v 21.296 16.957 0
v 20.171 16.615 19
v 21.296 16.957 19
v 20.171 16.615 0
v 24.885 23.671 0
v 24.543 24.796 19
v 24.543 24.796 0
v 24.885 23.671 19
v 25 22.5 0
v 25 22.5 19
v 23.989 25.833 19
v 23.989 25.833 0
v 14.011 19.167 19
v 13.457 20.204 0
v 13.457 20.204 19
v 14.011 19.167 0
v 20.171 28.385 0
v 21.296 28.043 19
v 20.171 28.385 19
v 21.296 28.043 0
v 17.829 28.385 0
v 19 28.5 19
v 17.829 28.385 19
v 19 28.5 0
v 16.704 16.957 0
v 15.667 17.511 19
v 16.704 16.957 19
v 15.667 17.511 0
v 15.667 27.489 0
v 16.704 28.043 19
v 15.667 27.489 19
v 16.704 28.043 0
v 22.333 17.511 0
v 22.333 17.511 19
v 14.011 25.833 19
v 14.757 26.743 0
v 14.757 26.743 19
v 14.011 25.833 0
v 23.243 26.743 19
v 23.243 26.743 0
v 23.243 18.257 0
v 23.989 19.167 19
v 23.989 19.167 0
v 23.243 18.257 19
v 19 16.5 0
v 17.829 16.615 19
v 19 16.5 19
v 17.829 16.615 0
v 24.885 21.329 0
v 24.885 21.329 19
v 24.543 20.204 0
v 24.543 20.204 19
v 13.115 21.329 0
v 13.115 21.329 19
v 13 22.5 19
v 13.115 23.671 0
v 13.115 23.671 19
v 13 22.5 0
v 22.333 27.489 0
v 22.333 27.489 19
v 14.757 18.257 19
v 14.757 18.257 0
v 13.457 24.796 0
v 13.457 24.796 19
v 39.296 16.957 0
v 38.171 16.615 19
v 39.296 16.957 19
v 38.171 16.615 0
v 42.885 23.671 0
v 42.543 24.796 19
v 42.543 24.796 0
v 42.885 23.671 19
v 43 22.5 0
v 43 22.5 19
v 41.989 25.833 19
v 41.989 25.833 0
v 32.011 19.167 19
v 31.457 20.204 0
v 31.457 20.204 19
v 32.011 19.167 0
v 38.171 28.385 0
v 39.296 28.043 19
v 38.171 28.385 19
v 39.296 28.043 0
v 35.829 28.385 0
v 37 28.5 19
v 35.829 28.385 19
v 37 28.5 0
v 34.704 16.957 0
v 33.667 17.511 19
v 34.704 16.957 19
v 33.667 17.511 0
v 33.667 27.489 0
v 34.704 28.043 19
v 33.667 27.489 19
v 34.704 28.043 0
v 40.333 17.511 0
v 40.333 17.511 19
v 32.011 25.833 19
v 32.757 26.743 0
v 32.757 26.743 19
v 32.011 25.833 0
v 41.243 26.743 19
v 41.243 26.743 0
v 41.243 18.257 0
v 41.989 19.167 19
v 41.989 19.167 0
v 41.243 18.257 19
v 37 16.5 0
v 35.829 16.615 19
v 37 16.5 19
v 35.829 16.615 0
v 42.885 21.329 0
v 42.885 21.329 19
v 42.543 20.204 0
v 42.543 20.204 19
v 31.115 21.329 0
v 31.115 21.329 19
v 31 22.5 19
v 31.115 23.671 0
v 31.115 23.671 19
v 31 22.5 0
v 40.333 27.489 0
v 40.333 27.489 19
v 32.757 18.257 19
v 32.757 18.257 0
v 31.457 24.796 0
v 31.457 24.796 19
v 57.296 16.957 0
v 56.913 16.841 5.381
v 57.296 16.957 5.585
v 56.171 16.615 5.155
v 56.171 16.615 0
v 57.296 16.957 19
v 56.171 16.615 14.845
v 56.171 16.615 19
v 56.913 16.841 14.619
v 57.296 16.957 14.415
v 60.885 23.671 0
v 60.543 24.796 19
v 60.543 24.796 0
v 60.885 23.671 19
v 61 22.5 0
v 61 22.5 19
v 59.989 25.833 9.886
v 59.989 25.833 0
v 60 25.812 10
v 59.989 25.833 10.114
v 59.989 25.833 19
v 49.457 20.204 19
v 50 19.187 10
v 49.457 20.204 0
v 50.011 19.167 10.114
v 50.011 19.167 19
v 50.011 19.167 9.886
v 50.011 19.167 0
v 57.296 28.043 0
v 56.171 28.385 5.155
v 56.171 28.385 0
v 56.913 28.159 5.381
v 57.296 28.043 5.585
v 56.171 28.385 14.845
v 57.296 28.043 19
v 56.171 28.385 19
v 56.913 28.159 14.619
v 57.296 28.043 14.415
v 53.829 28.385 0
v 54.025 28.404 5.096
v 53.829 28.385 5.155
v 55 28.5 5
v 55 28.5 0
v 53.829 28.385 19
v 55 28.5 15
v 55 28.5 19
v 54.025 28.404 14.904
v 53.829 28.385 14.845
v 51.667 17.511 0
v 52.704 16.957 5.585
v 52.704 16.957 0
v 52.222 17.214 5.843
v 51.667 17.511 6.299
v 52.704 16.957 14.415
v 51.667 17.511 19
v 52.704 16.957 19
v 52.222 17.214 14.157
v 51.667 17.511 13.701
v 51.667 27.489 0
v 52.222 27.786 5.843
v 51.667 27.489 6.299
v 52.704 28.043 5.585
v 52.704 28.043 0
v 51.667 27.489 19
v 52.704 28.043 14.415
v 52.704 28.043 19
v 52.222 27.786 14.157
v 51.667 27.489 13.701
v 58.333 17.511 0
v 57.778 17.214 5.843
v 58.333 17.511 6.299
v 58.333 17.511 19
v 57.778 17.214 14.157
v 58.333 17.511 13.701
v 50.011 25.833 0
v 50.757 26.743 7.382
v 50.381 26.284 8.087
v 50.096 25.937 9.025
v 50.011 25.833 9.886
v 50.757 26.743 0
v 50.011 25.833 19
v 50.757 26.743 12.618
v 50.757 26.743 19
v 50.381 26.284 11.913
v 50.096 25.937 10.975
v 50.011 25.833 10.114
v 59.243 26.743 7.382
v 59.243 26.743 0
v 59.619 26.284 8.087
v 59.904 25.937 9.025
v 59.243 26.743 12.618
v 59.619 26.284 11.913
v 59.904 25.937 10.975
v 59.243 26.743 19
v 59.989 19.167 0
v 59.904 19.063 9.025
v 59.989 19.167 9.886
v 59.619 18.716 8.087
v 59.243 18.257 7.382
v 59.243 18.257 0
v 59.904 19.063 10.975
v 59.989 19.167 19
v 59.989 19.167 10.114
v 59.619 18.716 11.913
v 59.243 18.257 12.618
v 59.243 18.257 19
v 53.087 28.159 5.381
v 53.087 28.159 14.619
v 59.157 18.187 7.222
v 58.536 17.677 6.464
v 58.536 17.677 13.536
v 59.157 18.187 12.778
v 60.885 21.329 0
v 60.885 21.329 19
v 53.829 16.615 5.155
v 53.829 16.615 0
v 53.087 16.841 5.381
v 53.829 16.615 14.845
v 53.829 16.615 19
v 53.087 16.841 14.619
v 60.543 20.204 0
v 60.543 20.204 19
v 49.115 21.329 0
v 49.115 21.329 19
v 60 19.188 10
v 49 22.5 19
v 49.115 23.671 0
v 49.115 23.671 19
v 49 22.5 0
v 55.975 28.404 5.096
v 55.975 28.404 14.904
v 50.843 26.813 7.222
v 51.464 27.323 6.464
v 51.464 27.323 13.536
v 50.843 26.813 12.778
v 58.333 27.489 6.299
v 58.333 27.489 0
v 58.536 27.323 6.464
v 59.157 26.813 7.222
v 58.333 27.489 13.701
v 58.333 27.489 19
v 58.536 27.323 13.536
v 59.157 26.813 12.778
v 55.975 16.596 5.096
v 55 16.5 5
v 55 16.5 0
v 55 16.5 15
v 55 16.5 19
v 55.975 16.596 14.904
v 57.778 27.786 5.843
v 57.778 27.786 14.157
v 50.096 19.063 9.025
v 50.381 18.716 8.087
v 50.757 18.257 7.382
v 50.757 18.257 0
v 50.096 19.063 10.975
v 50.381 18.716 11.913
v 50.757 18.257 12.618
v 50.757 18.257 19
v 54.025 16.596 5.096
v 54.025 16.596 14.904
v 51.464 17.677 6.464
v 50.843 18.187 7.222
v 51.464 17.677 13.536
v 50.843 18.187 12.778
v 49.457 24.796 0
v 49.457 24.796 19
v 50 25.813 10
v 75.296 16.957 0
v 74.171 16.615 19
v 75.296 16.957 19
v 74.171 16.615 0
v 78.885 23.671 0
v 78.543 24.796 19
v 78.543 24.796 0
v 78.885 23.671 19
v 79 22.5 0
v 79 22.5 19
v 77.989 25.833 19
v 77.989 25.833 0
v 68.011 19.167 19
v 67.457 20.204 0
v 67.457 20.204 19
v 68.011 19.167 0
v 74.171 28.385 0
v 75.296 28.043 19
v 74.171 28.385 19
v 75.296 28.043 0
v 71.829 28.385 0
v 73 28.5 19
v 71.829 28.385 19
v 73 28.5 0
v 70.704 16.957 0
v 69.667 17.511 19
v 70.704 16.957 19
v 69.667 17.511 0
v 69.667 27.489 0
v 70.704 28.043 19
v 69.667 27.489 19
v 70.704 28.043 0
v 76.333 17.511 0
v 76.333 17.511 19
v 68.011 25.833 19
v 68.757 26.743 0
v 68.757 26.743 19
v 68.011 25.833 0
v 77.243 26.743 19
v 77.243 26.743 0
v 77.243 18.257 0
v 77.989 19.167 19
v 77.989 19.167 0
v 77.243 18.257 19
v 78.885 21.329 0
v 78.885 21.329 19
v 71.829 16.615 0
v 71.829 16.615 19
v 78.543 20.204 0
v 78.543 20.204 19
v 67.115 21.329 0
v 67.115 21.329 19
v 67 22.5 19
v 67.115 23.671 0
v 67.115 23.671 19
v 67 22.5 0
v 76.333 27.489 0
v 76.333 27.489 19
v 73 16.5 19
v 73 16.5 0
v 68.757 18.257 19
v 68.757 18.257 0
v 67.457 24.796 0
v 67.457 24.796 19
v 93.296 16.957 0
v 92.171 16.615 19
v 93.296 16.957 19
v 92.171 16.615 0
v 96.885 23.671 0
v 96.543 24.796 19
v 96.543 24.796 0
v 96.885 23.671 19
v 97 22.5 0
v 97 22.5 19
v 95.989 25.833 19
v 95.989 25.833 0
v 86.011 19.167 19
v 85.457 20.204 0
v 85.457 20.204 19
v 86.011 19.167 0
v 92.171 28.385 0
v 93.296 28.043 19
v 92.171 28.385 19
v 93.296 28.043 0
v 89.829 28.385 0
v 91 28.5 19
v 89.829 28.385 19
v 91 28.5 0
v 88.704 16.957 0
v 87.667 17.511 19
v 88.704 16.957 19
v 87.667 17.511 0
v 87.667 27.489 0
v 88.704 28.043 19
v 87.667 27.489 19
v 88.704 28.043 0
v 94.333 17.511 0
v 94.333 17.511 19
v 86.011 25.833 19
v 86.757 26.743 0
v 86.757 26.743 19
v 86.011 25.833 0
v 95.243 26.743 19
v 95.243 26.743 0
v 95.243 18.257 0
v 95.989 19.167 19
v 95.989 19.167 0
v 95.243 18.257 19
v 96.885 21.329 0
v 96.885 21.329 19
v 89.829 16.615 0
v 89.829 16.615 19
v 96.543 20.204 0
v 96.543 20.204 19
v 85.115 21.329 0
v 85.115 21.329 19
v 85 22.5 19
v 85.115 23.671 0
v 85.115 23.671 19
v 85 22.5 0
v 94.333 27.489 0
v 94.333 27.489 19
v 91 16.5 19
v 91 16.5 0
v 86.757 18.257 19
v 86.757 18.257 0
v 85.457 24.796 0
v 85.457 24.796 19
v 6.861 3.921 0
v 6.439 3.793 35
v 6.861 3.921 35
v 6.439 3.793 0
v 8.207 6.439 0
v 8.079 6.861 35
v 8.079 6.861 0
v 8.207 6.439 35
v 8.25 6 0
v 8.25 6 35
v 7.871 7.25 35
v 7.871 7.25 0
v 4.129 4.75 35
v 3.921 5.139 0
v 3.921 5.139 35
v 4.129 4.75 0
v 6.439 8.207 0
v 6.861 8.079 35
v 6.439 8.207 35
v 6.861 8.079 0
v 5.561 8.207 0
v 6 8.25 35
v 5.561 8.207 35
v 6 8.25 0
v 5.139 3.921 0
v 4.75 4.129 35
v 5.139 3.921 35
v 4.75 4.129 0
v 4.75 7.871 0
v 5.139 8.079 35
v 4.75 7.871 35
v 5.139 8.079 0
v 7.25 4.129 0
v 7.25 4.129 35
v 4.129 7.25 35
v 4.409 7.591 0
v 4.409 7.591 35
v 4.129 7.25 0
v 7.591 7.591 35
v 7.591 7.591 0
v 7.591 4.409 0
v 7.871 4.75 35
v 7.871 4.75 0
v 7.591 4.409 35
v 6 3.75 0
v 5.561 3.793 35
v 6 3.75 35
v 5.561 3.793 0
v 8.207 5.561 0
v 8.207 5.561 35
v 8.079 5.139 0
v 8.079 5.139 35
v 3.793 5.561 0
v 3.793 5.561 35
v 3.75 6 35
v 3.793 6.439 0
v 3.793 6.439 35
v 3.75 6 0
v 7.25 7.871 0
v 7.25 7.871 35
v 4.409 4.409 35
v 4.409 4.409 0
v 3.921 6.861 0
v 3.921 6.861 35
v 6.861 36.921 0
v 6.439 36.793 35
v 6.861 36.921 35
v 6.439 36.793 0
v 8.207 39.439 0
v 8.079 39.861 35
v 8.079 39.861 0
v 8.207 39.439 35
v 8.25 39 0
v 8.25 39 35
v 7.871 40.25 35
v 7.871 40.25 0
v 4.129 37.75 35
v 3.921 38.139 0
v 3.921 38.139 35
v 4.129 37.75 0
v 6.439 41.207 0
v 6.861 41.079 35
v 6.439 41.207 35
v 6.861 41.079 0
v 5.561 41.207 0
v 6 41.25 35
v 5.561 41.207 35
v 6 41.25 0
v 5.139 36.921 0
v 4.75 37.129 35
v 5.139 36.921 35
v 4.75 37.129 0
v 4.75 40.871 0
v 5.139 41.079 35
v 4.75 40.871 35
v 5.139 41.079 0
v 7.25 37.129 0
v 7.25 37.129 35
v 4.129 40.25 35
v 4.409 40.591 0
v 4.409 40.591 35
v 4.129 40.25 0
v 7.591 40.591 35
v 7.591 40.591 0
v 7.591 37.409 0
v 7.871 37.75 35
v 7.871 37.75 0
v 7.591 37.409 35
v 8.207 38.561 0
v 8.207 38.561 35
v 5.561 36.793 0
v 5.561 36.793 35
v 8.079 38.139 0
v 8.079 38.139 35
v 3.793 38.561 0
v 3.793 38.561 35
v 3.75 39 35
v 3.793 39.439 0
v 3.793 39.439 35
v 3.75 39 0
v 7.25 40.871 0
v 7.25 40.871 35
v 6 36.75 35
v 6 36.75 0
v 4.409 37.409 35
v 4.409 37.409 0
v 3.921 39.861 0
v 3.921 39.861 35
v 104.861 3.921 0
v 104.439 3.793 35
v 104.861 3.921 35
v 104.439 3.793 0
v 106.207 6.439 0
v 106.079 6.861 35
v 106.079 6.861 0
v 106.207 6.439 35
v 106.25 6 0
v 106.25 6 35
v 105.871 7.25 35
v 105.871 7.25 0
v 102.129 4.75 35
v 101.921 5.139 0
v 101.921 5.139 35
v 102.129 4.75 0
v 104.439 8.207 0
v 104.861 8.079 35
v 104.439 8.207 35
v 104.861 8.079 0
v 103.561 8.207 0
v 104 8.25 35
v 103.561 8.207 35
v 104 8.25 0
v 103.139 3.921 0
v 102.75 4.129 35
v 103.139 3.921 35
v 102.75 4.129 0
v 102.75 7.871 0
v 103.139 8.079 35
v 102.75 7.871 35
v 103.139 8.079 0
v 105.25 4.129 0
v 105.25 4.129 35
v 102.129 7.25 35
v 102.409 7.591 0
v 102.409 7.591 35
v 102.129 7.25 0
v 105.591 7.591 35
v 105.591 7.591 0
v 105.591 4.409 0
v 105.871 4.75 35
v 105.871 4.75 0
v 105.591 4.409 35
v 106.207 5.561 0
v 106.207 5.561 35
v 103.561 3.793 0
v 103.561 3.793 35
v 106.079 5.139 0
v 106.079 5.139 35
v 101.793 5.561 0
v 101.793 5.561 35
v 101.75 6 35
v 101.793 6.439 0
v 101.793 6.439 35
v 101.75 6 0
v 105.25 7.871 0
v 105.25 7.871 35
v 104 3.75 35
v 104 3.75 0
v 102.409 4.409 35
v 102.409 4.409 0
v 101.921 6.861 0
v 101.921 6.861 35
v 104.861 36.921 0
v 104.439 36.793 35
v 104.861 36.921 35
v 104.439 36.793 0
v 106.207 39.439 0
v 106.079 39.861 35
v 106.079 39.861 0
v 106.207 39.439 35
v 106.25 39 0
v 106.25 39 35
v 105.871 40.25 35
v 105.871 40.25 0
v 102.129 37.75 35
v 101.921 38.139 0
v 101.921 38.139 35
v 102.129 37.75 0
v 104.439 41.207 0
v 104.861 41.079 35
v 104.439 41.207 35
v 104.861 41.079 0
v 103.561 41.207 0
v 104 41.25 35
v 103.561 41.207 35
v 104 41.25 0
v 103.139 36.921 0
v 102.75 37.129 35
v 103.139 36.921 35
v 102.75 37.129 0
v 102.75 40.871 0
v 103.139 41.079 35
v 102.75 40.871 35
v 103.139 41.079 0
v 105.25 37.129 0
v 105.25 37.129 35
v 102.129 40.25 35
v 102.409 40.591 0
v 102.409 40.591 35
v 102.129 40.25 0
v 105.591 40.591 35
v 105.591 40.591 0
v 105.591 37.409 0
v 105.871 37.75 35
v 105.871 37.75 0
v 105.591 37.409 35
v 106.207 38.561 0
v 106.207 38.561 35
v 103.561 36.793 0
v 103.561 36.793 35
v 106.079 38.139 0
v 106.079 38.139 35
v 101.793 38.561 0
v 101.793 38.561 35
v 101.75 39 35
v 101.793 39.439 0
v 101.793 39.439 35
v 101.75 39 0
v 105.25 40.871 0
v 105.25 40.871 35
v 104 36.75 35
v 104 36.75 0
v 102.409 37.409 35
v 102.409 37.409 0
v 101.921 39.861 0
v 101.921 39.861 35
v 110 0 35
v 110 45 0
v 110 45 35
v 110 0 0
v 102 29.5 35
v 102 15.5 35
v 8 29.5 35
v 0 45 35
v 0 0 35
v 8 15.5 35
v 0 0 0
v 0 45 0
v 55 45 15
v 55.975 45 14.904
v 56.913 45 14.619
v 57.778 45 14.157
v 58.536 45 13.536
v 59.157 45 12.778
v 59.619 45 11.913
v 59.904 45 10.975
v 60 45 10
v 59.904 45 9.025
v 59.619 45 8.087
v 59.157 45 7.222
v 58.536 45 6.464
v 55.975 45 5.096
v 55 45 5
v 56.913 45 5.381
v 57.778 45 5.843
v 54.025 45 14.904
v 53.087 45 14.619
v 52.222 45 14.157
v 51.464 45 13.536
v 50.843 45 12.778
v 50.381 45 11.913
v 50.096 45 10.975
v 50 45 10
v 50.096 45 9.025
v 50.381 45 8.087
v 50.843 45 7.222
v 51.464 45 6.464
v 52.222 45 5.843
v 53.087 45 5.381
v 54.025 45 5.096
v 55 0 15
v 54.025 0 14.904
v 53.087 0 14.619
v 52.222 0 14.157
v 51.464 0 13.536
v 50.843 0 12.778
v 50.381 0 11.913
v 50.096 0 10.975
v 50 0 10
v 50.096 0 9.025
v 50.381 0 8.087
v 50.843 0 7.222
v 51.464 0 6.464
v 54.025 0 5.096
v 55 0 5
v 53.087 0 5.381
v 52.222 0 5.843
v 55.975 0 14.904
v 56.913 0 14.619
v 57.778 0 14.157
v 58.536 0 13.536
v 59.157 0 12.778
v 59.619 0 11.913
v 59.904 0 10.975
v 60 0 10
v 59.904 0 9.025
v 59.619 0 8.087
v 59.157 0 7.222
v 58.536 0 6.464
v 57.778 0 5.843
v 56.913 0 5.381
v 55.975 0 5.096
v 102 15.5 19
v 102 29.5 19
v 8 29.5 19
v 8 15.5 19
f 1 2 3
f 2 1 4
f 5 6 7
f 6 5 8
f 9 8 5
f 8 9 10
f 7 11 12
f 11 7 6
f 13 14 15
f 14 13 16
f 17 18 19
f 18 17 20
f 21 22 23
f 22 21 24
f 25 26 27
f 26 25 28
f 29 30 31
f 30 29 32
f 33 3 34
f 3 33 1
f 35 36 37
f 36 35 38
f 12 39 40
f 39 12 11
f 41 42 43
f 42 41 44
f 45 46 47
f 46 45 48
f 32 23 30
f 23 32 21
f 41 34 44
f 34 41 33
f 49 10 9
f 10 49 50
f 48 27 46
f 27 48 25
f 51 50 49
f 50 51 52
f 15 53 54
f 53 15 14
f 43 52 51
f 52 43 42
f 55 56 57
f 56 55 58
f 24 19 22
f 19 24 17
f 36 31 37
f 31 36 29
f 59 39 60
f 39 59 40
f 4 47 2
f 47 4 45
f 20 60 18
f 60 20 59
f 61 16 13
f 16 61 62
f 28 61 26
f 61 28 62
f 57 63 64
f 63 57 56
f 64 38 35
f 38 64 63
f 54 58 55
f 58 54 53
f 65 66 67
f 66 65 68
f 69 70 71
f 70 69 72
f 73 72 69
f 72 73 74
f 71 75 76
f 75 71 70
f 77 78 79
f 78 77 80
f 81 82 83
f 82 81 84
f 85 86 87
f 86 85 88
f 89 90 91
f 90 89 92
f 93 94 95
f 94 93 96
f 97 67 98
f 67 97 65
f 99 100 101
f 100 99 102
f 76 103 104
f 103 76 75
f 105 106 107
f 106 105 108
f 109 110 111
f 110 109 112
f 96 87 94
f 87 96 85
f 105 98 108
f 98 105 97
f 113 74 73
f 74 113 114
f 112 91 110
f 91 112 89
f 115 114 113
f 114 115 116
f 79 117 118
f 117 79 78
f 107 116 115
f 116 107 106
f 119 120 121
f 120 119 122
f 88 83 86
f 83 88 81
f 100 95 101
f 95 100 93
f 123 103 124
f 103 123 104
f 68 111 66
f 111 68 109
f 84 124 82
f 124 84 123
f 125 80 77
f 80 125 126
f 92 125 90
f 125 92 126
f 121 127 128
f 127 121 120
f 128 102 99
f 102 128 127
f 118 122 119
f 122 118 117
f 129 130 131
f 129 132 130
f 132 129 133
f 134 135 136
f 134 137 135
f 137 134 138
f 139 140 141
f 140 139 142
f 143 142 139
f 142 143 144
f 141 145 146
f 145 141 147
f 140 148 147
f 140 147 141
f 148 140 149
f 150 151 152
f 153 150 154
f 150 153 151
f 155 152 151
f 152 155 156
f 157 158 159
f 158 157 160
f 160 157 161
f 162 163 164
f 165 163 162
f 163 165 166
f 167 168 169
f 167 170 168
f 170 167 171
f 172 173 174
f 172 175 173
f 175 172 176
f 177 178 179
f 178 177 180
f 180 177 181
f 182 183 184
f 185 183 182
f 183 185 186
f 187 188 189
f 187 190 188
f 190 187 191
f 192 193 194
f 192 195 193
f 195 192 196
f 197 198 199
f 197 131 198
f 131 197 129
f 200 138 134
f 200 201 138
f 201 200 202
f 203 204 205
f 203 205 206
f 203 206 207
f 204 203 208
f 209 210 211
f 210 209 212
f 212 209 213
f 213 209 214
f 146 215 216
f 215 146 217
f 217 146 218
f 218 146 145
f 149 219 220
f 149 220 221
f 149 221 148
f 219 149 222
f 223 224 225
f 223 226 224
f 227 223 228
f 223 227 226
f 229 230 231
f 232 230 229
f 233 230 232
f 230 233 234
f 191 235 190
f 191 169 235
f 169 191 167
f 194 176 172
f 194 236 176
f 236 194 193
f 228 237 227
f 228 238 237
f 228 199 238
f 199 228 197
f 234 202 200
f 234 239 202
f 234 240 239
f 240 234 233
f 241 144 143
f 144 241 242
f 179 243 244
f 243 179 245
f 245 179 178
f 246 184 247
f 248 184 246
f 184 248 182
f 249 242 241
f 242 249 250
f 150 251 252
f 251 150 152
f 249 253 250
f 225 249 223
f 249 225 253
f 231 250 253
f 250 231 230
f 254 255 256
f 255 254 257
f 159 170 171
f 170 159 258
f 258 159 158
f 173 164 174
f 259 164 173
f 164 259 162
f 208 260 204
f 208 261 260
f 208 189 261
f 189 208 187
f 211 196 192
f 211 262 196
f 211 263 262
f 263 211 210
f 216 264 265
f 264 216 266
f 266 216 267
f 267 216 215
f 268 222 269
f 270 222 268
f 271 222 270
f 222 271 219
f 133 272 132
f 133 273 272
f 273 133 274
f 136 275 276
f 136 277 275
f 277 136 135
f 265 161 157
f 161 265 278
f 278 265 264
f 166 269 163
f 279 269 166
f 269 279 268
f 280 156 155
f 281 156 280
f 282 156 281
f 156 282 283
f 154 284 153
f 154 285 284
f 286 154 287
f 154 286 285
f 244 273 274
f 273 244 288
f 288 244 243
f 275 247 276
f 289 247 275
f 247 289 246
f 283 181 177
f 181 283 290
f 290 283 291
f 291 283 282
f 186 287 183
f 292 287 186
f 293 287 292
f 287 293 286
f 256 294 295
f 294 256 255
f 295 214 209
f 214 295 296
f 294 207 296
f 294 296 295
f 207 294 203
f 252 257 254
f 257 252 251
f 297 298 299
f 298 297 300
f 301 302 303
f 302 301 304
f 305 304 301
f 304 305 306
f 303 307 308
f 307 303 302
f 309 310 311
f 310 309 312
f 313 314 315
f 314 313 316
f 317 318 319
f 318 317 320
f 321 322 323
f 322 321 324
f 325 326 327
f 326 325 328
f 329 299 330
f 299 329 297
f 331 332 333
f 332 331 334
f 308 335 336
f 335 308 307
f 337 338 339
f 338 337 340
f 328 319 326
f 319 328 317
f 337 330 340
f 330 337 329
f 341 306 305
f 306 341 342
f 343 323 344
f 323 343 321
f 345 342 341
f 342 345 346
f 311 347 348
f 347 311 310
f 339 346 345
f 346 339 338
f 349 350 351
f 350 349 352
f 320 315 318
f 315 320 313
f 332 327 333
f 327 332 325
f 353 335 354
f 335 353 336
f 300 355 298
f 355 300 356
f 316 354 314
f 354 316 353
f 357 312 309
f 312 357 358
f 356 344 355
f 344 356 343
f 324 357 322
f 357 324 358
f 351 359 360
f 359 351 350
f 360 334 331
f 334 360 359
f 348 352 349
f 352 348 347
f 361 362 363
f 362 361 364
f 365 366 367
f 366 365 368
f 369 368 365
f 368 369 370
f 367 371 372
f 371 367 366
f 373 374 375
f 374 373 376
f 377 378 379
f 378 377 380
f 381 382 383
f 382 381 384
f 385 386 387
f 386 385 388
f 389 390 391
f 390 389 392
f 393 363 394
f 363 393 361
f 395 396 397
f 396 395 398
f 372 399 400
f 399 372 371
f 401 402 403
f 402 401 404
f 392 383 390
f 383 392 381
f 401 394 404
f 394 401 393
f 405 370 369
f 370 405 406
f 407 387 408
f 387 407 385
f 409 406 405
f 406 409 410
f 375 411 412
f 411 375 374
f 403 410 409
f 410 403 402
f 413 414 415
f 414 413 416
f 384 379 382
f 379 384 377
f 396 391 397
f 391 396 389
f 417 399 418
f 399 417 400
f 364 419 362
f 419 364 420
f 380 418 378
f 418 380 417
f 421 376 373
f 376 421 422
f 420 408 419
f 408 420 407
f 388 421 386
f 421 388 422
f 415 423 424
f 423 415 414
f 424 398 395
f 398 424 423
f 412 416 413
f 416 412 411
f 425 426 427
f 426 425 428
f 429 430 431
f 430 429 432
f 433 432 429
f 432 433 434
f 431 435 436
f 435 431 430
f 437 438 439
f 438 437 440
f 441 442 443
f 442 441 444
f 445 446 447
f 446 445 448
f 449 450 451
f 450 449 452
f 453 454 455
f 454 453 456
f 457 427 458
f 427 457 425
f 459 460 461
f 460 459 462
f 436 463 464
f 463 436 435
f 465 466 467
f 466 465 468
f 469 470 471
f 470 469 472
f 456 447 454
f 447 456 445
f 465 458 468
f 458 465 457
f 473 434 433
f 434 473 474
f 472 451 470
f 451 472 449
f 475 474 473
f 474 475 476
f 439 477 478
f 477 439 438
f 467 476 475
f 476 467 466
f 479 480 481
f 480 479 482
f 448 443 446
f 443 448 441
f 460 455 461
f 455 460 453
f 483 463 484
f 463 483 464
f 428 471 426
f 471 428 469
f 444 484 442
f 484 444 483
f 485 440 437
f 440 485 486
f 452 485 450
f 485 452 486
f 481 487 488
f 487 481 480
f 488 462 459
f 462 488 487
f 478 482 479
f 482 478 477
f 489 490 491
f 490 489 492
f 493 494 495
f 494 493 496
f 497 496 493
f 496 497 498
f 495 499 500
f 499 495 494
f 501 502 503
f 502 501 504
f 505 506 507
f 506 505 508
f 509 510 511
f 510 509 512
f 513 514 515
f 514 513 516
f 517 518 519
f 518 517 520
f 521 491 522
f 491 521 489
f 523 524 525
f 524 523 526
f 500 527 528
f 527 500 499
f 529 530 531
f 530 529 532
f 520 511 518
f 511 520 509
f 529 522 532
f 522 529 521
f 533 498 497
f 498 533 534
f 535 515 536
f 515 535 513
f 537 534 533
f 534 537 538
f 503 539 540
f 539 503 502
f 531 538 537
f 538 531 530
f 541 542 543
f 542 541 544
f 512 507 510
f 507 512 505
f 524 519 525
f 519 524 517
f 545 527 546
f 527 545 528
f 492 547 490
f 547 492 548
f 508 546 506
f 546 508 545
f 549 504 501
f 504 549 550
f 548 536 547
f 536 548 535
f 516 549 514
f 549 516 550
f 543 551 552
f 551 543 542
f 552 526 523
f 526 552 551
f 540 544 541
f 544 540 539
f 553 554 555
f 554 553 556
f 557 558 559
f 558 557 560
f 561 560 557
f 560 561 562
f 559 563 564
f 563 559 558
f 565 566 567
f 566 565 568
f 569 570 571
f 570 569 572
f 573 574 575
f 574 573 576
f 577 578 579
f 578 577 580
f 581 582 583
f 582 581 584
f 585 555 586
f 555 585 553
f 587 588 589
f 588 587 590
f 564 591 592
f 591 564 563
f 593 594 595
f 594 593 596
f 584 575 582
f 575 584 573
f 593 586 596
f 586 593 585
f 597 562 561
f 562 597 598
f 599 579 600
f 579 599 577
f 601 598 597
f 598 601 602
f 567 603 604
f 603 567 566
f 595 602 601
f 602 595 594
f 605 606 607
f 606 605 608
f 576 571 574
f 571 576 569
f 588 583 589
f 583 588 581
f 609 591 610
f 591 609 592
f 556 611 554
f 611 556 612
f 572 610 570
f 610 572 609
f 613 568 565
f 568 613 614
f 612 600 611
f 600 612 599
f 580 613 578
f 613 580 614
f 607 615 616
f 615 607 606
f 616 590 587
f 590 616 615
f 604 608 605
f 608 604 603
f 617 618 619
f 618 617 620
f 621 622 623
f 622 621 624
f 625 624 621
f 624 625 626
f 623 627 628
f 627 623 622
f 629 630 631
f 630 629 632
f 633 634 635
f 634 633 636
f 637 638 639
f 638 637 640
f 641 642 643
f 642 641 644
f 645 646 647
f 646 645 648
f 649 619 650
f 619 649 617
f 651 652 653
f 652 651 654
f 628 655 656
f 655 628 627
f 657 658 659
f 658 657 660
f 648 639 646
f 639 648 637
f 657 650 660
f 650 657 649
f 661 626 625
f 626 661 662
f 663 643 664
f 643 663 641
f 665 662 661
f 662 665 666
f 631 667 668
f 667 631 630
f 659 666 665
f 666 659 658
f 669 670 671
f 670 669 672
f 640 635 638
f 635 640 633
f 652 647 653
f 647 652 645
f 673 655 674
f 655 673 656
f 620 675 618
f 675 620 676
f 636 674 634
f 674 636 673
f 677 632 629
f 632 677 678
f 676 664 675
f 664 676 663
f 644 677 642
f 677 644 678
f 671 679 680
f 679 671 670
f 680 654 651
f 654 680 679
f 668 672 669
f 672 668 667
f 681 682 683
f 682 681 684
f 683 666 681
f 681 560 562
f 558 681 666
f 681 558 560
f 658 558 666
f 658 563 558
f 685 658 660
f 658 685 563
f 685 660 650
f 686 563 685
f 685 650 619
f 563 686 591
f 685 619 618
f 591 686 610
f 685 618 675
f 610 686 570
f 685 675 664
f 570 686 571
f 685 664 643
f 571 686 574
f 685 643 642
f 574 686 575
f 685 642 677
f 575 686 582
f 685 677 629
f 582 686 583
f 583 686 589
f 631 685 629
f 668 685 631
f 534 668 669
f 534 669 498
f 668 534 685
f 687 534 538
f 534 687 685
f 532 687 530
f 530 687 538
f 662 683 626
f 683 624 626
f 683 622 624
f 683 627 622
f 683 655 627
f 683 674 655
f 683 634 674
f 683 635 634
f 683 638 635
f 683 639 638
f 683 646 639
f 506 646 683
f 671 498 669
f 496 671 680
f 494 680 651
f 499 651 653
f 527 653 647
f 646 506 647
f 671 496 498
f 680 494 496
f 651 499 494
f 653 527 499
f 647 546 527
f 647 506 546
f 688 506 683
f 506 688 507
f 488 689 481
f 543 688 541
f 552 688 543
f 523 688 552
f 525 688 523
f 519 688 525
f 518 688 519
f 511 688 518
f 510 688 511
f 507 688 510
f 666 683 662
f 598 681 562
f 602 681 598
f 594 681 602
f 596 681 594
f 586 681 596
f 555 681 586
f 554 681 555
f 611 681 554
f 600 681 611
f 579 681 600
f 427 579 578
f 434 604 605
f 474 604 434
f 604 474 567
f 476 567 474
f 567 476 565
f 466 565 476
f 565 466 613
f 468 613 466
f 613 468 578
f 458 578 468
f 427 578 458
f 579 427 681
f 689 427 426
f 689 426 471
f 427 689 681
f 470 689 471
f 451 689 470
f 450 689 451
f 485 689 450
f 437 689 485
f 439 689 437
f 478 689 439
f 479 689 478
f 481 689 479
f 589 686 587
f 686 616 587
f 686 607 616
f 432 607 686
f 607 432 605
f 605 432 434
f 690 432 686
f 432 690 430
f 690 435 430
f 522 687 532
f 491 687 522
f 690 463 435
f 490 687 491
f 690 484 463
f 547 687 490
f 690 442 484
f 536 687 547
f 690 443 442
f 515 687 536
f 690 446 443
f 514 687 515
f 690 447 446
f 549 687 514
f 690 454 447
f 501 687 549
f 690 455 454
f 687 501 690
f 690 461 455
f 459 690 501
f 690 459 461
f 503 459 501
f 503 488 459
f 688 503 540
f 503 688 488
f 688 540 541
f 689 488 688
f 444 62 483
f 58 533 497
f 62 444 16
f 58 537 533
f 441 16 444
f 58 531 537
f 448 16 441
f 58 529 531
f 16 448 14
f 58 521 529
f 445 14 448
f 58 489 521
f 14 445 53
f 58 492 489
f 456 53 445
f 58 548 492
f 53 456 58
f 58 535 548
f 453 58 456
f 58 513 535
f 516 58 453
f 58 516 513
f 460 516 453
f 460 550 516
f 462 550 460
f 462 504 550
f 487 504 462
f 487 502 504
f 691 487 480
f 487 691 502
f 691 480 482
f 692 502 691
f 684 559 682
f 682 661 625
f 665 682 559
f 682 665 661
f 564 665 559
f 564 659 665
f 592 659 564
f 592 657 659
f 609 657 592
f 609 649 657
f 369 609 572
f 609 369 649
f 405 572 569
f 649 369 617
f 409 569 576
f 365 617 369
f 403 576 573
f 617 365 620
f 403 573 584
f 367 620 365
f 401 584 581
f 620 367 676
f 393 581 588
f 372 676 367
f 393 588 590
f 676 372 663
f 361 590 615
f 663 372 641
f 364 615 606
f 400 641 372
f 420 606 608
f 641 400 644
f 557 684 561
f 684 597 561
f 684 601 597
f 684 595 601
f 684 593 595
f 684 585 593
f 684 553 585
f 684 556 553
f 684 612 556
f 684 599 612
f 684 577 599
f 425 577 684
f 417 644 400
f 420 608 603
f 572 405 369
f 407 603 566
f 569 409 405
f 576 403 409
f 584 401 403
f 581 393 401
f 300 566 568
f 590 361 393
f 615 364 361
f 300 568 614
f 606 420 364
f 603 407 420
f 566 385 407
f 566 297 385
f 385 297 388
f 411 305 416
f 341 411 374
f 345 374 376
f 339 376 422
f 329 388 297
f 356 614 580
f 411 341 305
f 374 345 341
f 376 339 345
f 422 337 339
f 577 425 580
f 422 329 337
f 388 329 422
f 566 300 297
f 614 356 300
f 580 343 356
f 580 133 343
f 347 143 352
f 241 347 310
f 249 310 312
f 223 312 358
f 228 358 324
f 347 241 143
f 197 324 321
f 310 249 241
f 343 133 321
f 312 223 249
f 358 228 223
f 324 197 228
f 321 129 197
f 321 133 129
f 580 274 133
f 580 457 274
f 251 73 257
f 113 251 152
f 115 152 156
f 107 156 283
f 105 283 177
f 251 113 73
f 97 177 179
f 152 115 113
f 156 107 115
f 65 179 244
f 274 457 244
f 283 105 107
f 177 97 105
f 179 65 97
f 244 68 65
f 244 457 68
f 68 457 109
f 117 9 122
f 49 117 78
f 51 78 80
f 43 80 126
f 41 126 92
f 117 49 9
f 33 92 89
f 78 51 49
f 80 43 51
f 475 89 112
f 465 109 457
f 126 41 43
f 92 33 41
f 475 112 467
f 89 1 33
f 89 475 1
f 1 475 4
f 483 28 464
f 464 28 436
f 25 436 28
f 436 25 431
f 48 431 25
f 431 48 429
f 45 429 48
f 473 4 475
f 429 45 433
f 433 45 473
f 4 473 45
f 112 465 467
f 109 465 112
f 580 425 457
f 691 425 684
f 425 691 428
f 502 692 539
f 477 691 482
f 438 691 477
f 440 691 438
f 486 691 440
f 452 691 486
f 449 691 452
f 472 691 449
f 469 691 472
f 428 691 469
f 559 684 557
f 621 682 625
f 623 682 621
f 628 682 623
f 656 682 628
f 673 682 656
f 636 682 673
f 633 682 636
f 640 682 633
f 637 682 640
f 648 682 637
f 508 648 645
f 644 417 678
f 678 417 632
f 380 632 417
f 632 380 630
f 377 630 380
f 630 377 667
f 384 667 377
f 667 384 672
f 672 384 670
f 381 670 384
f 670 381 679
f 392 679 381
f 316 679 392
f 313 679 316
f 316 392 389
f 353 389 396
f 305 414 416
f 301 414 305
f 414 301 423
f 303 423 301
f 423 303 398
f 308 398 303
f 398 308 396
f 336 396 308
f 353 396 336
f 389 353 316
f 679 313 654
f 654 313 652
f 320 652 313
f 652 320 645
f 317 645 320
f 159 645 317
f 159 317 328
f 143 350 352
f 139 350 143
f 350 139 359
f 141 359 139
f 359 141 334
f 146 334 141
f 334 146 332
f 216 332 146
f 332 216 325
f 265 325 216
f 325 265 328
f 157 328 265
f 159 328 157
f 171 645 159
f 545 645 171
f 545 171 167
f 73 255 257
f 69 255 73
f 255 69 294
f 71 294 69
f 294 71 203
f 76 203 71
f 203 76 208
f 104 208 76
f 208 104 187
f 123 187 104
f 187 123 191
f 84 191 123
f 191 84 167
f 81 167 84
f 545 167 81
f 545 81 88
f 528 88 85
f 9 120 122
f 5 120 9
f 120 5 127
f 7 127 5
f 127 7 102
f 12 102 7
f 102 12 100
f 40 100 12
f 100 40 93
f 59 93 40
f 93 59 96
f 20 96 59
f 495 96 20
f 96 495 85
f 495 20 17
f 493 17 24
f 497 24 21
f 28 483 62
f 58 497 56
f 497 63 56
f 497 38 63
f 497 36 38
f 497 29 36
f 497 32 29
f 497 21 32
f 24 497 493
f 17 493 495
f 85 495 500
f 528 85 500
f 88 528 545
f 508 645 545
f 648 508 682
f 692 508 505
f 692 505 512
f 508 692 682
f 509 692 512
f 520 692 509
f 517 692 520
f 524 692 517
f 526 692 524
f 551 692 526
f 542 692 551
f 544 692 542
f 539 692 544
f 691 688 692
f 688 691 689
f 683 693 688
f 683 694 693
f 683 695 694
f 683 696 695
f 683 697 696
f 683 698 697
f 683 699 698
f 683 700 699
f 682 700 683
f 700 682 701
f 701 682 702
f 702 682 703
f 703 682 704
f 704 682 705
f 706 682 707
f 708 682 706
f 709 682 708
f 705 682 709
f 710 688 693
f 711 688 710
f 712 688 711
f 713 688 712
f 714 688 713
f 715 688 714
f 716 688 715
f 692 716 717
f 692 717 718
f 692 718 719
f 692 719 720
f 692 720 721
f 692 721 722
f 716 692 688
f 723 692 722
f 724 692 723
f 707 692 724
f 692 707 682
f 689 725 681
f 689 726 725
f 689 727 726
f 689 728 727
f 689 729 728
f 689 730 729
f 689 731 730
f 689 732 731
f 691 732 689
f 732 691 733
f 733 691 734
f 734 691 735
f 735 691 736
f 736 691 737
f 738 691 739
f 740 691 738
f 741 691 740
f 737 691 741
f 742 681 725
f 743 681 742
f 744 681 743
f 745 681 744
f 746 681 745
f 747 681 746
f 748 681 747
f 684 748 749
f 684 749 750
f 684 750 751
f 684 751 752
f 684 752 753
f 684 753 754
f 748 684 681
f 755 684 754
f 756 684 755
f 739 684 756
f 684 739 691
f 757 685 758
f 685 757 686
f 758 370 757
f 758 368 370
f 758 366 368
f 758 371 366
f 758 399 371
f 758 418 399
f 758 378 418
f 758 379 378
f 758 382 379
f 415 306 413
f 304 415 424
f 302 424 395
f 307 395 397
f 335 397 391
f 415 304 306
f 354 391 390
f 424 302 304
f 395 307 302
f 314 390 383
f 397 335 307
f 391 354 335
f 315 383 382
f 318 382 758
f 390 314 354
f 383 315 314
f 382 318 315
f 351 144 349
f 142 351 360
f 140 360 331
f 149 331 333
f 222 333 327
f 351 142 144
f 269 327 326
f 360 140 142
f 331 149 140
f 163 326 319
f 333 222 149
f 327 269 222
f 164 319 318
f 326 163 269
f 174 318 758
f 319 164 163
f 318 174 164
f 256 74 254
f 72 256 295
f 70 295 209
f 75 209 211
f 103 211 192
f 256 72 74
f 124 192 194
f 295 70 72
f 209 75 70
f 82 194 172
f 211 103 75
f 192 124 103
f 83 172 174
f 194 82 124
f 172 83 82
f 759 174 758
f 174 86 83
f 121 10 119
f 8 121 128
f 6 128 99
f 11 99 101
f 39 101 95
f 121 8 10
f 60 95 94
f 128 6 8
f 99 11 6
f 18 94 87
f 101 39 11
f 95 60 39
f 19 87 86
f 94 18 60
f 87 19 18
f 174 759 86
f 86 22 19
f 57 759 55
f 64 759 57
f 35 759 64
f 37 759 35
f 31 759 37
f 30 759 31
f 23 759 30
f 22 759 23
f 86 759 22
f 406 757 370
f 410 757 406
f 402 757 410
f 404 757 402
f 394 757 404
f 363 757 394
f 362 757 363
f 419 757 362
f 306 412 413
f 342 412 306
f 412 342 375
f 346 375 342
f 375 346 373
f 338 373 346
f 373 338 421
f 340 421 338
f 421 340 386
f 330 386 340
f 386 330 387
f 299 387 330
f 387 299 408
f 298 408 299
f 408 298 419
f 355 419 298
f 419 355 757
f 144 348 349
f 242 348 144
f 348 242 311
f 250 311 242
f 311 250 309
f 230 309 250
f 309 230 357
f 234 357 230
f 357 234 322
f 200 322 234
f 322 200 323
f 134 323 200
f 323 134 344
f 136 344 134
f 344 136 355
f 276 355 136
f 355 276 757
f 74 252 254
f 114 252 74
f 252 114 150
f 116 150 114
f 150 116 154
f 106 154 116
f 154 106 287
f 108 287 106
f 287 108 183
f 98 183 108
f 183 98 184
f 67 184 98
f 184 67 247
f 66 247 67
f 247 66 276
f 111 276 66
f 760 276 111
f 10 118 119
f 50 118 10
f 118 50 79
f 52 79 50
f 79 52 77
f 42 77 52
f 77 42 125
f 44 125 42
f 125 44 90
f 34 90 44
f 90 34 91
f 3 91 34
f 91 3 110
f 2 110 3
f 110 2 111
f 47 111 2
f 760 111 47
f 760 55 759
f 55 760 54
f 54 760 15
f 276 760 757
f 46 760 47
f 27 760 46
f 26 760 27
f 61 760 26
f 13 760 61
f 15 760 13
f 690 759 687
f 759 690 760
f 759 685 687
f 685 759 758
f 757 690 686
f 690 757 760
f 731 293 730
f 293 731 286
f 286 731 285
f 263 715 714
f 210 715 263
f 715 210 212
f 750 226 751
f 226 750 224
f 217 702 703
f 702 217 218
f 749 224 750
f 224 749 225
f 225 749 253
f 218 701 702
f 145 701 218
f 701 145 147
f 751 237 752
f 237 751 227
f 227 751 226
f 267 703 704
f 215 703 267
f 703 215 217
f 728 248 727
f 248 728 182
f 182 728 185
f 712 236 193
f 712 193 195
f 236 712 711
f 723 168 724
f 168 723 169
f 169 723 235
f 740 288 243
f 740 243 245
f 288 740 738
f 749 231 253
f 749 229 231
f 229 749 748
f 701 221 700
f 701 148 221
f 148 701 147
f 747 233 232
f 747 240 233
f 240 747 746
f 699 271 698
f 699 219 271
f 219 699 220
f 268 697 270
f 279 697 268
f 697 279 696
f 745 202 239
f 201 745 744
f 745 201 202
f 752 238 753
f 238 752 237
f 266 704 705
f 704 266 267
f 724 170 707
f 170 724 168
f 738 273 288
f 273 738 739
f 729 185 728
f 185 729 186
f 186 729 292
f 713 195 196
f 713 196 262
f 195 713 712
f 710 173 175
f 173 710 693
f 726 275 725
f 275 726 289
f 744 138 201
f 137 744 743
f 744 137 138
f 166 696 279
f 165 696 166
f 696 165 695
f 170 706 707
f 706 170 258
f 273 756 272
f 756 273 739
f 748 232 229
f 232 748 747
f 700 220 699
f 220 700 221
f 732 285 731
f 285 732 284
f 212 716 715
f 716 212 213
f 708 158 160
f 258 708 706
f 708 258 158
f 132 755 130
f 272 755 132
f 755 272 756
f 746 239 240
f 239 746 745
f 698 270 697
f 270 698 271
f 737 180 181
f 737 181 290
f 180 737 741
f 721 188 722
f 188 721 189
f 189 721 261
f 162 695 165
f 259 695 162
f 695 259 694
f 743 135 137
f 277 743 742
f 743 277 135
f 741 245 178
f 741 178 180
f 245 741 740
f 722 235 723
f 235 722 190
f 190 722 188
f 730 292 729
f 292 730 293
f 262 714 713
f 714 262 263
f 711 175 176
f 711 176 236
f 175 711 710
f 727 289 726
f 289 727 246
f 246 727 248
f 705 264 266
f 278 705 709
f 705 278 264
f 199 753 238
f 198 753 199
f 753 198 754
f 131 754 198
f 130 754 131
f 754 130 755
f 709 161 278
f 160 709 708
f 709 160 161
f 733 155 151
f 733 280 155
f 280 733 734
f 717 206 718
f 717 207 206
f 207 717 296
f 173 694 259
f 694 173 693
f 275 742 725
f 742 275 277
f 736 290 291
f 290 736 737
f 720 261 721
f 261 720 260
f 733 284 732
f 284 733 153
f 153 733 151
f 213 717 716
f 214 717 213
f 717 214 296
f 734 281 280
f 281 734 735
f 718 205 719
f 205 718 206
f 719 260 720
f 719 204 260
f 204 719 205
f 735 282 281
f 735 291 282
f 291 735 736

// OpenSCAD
$fn = 32;

// ----------------------------------------------------------------------
// Manifold block: side_outlet manifold
// ----------------------------------------------------------------------

// --- parameters (mm) ---
block_l = 110;            // block length, X
block_w = 45;             // block width, Y
block_h = 35;             // block height, Z
port_d = 12;              // port bore diameter
port_pitch = 18;          // port pitch along X
gallery_d = 14;           // top gallery width, Y
gallery_depth = 16;       // gallery pocket depth
wall_p = 8;               // gallery end wall thickness, X
mnt_d = 4.5;              // mounting hole diameter
mnt_in = 6;               // mounting hole inset from the edges
out_d = 10;               // outlet bore diameter
out_z = 10;               // outlet axis height

n_ports = 5;  // ports in the row
port_x0 = (block_l - (n_ports - 1) * port_pitch) / 2;  // first port X

difference() {
  cube([block_l, block_w, block_h]);
  for (i = [0 : n_ports - 1])
    translate([port_x0 + i * port_pitch, block_w / 2, -1])
      cylinder(h = block_h + 2, d = port_d);
  translate([wall_p, block_w / 2 - gallery_d / 2, block_h - gallery_depth])
    cube([block_l - 2 * wall_p, gallery_d, gallery_depth + 1]);
  for (cx = [mnt_in, block_l - mnt_in])
    for (cy = [mnt_in, block_w - mnt_in])
      translate([cx, cy, -1]) cylinder(h = block_h + 2, d = mnt_d);
  translate([block_l / 2, -1, out_z]) rotate([-90, 0, 0])
    cylinder(h = block_w + 2, d = out_d);
}
